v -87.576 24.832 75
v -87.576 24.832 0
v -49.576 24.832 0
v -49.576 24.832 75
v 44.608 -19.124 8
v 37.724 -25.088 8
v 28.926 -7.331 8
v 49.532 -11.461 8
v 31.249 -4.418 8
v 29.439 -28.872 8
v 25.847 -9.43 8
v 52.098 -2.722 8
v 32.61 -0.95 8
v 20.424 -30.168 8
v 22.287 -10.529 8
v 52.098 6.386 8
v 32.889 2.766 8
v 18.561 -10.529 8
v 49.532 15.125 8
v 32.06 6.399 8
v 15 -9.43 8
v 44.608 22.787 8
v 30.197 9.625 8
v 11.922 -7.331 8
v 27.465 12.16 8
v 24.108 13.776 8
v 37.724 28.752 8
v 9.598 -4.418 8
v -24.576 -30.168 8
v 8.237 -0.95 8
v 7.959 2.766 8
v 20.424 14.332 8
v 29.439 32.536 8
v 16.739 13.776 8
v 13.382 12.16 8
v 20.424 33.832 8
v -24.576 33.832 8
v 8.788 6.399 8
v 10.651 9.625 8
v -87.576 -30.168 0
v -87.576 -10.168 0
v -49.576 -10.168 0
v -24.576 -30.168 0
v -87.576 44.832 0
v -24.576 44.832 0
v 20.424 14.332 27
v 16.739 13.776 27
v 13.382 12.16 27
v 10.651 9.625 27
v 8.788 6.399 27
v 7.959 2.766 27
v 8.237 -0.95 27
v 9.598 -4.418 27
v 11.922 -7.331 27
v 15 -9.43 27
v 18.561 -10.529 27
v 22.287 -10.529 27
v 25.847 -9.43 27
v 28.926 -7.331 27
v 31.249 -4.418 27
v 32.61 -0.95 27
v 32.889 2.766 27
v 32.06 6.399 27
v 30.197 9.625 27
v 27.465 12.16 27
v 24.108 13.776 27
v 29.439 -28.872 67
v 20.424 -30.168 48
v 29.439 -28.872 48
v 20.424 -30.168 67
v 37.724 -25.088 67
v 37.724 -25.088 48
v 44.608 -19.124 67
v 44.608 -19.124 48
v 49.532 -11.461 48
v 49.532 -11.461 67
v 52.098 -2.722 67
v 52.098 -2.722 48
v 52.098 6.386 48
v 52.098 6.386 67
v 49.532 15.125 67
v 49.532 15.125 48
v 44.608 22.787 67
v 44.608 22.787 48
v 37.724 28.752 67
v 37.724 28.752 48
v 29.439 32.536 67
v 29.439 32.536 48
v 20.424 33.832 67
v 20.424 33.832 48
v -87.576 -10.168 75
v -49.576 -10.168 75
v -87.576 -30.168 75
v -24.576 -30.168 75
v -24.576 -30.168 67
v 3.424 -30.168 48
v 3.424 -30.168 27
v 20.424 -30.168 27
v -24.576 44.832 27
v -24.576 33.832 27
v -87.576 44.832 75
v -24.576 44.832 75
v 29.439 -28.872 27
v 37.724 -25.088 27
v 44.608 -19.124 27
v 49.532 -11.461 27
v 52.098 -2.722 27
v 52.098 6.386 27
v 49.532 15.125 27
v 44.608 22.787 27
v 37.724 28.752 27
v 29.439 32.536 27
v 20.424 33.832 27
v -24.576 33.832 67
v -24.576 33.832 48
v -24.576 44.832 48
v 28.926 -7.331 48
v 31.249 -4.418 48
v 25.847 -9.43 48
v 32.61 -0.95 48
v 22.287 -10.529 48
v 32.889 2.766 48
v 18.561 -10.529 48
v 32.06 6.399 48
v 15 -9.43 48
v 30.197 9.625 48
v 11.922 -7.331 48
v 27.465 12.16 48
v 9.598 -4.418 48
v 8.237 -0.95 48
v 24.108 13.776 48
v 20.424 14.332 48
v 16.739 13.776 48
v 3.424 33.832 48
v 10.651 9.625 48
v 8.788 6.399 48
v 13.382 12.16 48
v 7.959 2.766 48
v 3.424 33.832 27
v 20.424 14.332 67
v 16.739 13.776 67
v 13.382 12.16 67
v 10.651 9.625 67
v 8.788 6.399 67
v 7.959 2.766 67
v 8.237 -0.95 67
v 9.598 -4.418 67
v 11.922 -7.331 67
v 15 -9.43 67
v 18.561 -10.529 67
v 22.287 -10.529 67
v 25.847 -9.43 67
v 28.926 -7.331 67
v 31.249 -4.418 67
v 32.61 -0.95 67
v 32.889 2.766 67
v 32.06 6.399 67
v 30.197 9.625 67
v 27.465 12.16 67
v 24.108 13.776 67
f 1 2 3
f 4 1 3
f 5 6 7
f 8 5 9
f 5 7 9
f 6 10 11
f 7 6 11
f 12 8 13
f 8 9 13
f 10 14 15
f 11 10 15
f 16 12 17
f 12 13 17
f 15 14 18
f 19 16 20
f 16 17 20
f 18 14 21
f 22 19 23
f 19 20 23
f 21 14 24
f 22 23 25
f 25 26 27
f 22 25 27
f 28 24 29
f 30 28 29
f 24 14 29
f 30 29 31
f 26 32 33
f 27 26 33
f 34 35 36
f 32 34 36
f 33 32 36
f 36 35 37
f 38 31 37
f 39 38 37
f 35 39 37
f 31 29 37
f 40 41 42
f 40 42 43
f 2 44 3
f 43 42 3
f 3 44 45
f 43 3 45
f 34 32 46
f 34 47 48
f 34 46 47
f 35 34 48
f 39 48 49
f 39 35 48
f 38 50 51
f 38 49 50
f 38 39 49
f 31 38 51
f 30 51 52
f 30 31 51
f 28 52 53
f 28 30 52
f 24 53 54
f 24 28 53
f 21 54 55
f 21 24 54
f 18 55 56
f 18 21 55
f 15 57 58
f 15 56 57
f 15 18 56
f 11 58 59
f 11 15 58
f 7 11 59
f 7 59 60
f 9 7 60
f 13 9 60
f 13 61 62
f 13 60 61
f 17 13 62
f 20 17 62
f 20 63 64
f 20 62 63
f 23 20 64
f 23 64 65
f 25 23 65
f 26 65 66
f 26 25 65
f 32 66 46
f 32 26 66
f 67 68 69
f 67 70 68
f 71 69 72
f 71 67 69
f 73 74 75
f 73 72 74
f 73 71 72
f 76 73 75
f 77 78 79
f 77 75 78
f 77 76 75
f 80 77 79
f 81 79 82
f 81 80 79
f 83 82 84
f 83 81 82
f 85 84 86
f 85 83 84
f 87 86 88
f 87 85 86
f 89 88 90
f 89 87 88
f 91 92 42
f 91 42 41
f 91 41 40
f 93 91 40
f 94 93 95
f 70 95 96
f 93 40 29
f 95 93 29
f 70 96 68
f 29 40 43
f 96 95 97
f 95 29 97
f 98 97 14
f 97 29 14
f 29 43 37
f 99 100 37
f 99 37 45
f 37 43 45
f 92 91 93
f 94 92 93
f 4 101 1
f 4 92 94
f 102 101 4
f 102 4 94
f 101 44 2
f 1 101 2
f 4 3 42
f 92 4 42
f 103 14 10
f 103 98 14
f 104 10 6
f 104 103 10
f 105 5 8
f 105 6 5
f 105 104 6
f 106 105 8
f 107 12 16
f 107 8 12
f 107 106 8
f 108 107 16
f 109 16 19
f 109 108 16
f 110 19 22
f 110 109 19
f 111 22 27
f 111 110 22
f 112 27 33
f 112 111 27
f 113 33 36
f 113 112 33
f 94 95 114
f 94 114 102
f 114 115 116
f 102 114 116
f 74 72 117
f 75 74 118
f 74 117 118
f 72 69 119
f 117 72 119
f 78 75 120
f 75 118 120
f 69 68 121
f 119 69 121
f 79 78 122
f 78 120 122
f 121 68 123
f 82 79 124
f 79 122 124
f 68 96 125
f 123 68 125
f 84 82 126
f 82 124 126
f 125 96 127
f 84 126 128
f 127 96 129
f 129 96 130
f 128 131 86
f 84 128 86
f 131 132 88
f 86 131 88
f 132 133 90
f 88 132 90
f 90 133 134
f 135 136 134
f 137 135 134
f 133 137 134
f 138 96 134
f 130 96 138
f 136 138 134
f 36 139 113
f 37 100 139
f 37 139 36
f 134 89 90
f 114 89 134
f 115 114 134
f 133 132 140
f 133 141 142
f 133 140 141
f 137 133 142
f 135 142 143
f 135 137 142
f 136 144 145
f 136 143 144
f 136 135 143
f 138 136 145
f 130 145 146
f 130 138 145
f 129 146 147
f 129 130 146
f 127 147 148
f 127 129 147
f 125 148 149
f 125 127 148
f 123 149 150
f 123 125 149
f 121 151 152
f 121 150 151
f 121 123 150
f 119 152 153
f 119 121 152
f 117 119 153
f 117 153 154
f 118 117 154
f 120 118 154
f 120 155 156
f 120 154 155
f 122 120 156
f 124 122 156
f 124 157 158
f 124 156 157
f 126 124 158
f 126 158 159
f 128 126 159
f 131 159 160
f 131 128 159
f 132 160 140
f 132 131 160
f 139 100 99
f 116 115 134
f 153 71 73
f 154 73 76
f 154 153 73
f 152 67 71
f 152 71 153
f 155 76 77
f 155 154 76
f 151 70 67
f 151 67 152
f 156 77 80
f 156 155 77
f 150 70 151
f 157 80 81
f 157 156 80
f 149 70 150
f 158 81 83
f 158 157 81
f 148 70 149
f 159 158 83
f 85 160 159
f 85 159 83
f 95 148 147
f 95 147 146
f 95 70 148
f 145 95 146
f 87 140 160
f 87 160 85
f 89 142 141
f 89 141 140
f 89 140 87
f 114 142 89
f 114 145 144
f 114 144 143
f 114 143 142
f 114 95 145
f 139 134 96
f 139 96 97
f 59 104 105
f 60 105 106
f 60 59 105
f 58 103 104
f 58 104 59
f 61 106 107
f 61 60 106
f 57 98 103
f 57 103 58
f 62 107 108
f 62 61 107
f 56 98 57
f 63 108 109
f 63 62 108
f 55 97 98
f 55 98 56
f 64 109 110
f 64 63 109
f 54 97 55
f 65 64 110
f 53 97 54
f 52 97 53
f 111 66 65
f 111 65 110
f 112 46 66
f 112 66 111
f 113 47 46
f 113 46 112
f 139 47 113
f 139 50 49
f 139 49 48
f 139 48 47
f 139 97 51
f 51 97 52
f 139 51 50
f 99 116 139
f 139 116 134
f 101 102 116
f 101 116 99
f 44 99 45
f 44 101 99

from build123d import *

# Parameters (mm, degrees)
Y_KSEKLIK_EKSTR_ZYON1_DEPTH = 75
IZIM3_W                     = 19
IZIM3_H                     = 64
Y_KSEKLIK_EKSTR_ZYON6_DEPTH = 77
RADYUS1_RADIUS              = 32
RADYUS1_LENGTH              = 19
RADYUS2_RADIUS              = 32
RADYUS2_LENGTH              = 19
KES_EKSTR_ZYON1_DEPTH       = 120.031428784
KES_EKSTR_ZYON1_DEPTH_BACK  = 120.031428784
IZIM4_R                     = 12.5
IZIM6_W                     = 21
IZIM6_H                     = 75
Y_KSEKLIK_EKSTR_ZYON7_DEPTH = 28
KES_EKSTR_ZYON3_REACH       = 111.469


with BuildPart() as part:
    # Çizim1 → Yükseklik-Ekstrüzyon1 (new body)
    with BuildSketch(Plane.XY):
        Polygon((-87.576185102, -10.168171558), (-87.576185102, -30.168171558), (-24.576185102, -30.168171558), (-24.576185102, 44.831828442), (-87.576185102, 44.831828442), (-87.576185102, 24.831828442), (-49.576185102, 24.831828442), (-49.576185102, -10.168171558), align=None)
    extrude(amount=Y_KSEKLIK_EKSTR_ZYON1_DEPTH)

    # Çizim3 → Yükseklik-Ekstrüzyon6 (add)
    with BuildSketch(Plane(origin=(-24.576185102, 0, 0), x_dir=(0, 0, -1), z_dir=(1, 0, 0))):
        with Locations((-57.5, 1.831828442)):
            Rectangle(IZIM3_W, IZIM3_H)
        with Locations((-17.5, 1.831828442)):
            Rectangle(IZIM3_W, IZIM3_H)
    extrude(amount=Y_KSEKLIK_EKSTR_ZYON6_DEPTH)

    # Radyus1: full round fillet: the end face becomes a half cylinder, R = half its width
    radyus1_face = Plane((52.423814898, 1.831828442, 57.5), x_dir=(0, 0, 1), z_dir=(1, 0, 0))  # on the end face: x along it, z out of the body
    radyus1_slab = radyus1_face.offset(-RADYUS1_RADIUS / 2) * Box(RADYUS1_LENGTH, 2 * RADYUS1_RADIUS, RADYUS1_RADIUS, mode=Mode.PRIVATE)  # the body's end, R deep
    radyus1_round = Plane((20.423814898, 1.831828442, 57.5), x_dir=(1, 0, 0), z_dir=(0, 0, 1)) * Cylinder(RADYUS1_RADIUS, RADYUS1_LENGTH, mode=Mode.PRIVATE)  # its axis R under the face
    add(radyus1_slab - radyus1_round, mode=Mode.SUBTRACT)

    # Radyus2: full round fillet: the end face becomes a half cylinder, R = half its width
    radyus2_face = Plane((52.423814898, 1.831828442, 17.5), x_dir=(0, 0, 1), z_dir=(1, 0, 0))  # on the end face: x along it, z out of the body
    radyus2_slab = radyus2_face.offset(-RADYUS2_RADIUS / 2) * Box(RADYUS2_LENGTH, 2 * RADYUS2_RADIUS, RADYUS2_RADIUS, mode=Mode.PRIVATE)  # the body's end, R deep
    radyus2_round = Plane((20.423814898, 1.831828442, 17.5), x_dir=(1, 0, 0), z_dir=(0, 0, 1)) * Cylinder(RADYUS2_RADIUS, RADYUS2_LENGTH, mode=Mode.PRIVATE)  # its axis R under the face
    add(radyus2_slab - radyus2_round, mode=Mode.SUBTRACT)

    # Çizim4 → Kes-Ekstrüzyon1 (cut, two sides: drawn at the far end of the back side and taken through both)
    with BuildSketch(Plane.XY.offset(67).offset(-KES_EKSTR_ZYON1_DEPTH_BACK)):
        with Locations(Location((20.423814898, 1.831828442, 0), (0, 0, 90))):
            Circle(IZIM4_R)
    extrude(amount=KES_EKSTR_ZYON1_DEPTH + KES_EKSTR_ZYON1_DEPTH_BACK, mode=Mode.SUBTRACT)

    # Çizim6 → Yükseklik-Ekstrüzyon7 (add)
    with BuildSketch(Plane(origin=(-24.576185102, 0, 0), x_dir=(0, 0, -1), z_dir=(1, 0, 0))):
        with Locations((-37.5, 7.331828442)):
            Rectangle(IZIM6_W, IZIM6_H)
    extrude(amount=Y_KSEKLIK_EKSTR_ZYON7_DEPTH)

    # Çizim7 → Kes-Ekstrüzyon3 (cut, up to next)
    with BuildSketch(Plane.XY.offset(48), mode=Mode.PRIVATE) as kes_ekstr_zyon3_sk1:
        Polygon((-24.576185102, 44.831828442), (3.423814898, 33.831828442), (3.423814898, 44.831828442), align=None)
    kes_ekstr_zyon3_tool1 = extrude(kes_ekstr_zyon3_sk1.sketch, amount=-KES_EKSTR_ZYON3_REACH, mode=Mode.PRIVATE) & part.part
    add(kes_ekstr_zyon3_tool1.solids().sort_by_distance((-5.909518, 41.165162, 48))[0], mode=Mode.SUBTRACT)


solid = part.part
